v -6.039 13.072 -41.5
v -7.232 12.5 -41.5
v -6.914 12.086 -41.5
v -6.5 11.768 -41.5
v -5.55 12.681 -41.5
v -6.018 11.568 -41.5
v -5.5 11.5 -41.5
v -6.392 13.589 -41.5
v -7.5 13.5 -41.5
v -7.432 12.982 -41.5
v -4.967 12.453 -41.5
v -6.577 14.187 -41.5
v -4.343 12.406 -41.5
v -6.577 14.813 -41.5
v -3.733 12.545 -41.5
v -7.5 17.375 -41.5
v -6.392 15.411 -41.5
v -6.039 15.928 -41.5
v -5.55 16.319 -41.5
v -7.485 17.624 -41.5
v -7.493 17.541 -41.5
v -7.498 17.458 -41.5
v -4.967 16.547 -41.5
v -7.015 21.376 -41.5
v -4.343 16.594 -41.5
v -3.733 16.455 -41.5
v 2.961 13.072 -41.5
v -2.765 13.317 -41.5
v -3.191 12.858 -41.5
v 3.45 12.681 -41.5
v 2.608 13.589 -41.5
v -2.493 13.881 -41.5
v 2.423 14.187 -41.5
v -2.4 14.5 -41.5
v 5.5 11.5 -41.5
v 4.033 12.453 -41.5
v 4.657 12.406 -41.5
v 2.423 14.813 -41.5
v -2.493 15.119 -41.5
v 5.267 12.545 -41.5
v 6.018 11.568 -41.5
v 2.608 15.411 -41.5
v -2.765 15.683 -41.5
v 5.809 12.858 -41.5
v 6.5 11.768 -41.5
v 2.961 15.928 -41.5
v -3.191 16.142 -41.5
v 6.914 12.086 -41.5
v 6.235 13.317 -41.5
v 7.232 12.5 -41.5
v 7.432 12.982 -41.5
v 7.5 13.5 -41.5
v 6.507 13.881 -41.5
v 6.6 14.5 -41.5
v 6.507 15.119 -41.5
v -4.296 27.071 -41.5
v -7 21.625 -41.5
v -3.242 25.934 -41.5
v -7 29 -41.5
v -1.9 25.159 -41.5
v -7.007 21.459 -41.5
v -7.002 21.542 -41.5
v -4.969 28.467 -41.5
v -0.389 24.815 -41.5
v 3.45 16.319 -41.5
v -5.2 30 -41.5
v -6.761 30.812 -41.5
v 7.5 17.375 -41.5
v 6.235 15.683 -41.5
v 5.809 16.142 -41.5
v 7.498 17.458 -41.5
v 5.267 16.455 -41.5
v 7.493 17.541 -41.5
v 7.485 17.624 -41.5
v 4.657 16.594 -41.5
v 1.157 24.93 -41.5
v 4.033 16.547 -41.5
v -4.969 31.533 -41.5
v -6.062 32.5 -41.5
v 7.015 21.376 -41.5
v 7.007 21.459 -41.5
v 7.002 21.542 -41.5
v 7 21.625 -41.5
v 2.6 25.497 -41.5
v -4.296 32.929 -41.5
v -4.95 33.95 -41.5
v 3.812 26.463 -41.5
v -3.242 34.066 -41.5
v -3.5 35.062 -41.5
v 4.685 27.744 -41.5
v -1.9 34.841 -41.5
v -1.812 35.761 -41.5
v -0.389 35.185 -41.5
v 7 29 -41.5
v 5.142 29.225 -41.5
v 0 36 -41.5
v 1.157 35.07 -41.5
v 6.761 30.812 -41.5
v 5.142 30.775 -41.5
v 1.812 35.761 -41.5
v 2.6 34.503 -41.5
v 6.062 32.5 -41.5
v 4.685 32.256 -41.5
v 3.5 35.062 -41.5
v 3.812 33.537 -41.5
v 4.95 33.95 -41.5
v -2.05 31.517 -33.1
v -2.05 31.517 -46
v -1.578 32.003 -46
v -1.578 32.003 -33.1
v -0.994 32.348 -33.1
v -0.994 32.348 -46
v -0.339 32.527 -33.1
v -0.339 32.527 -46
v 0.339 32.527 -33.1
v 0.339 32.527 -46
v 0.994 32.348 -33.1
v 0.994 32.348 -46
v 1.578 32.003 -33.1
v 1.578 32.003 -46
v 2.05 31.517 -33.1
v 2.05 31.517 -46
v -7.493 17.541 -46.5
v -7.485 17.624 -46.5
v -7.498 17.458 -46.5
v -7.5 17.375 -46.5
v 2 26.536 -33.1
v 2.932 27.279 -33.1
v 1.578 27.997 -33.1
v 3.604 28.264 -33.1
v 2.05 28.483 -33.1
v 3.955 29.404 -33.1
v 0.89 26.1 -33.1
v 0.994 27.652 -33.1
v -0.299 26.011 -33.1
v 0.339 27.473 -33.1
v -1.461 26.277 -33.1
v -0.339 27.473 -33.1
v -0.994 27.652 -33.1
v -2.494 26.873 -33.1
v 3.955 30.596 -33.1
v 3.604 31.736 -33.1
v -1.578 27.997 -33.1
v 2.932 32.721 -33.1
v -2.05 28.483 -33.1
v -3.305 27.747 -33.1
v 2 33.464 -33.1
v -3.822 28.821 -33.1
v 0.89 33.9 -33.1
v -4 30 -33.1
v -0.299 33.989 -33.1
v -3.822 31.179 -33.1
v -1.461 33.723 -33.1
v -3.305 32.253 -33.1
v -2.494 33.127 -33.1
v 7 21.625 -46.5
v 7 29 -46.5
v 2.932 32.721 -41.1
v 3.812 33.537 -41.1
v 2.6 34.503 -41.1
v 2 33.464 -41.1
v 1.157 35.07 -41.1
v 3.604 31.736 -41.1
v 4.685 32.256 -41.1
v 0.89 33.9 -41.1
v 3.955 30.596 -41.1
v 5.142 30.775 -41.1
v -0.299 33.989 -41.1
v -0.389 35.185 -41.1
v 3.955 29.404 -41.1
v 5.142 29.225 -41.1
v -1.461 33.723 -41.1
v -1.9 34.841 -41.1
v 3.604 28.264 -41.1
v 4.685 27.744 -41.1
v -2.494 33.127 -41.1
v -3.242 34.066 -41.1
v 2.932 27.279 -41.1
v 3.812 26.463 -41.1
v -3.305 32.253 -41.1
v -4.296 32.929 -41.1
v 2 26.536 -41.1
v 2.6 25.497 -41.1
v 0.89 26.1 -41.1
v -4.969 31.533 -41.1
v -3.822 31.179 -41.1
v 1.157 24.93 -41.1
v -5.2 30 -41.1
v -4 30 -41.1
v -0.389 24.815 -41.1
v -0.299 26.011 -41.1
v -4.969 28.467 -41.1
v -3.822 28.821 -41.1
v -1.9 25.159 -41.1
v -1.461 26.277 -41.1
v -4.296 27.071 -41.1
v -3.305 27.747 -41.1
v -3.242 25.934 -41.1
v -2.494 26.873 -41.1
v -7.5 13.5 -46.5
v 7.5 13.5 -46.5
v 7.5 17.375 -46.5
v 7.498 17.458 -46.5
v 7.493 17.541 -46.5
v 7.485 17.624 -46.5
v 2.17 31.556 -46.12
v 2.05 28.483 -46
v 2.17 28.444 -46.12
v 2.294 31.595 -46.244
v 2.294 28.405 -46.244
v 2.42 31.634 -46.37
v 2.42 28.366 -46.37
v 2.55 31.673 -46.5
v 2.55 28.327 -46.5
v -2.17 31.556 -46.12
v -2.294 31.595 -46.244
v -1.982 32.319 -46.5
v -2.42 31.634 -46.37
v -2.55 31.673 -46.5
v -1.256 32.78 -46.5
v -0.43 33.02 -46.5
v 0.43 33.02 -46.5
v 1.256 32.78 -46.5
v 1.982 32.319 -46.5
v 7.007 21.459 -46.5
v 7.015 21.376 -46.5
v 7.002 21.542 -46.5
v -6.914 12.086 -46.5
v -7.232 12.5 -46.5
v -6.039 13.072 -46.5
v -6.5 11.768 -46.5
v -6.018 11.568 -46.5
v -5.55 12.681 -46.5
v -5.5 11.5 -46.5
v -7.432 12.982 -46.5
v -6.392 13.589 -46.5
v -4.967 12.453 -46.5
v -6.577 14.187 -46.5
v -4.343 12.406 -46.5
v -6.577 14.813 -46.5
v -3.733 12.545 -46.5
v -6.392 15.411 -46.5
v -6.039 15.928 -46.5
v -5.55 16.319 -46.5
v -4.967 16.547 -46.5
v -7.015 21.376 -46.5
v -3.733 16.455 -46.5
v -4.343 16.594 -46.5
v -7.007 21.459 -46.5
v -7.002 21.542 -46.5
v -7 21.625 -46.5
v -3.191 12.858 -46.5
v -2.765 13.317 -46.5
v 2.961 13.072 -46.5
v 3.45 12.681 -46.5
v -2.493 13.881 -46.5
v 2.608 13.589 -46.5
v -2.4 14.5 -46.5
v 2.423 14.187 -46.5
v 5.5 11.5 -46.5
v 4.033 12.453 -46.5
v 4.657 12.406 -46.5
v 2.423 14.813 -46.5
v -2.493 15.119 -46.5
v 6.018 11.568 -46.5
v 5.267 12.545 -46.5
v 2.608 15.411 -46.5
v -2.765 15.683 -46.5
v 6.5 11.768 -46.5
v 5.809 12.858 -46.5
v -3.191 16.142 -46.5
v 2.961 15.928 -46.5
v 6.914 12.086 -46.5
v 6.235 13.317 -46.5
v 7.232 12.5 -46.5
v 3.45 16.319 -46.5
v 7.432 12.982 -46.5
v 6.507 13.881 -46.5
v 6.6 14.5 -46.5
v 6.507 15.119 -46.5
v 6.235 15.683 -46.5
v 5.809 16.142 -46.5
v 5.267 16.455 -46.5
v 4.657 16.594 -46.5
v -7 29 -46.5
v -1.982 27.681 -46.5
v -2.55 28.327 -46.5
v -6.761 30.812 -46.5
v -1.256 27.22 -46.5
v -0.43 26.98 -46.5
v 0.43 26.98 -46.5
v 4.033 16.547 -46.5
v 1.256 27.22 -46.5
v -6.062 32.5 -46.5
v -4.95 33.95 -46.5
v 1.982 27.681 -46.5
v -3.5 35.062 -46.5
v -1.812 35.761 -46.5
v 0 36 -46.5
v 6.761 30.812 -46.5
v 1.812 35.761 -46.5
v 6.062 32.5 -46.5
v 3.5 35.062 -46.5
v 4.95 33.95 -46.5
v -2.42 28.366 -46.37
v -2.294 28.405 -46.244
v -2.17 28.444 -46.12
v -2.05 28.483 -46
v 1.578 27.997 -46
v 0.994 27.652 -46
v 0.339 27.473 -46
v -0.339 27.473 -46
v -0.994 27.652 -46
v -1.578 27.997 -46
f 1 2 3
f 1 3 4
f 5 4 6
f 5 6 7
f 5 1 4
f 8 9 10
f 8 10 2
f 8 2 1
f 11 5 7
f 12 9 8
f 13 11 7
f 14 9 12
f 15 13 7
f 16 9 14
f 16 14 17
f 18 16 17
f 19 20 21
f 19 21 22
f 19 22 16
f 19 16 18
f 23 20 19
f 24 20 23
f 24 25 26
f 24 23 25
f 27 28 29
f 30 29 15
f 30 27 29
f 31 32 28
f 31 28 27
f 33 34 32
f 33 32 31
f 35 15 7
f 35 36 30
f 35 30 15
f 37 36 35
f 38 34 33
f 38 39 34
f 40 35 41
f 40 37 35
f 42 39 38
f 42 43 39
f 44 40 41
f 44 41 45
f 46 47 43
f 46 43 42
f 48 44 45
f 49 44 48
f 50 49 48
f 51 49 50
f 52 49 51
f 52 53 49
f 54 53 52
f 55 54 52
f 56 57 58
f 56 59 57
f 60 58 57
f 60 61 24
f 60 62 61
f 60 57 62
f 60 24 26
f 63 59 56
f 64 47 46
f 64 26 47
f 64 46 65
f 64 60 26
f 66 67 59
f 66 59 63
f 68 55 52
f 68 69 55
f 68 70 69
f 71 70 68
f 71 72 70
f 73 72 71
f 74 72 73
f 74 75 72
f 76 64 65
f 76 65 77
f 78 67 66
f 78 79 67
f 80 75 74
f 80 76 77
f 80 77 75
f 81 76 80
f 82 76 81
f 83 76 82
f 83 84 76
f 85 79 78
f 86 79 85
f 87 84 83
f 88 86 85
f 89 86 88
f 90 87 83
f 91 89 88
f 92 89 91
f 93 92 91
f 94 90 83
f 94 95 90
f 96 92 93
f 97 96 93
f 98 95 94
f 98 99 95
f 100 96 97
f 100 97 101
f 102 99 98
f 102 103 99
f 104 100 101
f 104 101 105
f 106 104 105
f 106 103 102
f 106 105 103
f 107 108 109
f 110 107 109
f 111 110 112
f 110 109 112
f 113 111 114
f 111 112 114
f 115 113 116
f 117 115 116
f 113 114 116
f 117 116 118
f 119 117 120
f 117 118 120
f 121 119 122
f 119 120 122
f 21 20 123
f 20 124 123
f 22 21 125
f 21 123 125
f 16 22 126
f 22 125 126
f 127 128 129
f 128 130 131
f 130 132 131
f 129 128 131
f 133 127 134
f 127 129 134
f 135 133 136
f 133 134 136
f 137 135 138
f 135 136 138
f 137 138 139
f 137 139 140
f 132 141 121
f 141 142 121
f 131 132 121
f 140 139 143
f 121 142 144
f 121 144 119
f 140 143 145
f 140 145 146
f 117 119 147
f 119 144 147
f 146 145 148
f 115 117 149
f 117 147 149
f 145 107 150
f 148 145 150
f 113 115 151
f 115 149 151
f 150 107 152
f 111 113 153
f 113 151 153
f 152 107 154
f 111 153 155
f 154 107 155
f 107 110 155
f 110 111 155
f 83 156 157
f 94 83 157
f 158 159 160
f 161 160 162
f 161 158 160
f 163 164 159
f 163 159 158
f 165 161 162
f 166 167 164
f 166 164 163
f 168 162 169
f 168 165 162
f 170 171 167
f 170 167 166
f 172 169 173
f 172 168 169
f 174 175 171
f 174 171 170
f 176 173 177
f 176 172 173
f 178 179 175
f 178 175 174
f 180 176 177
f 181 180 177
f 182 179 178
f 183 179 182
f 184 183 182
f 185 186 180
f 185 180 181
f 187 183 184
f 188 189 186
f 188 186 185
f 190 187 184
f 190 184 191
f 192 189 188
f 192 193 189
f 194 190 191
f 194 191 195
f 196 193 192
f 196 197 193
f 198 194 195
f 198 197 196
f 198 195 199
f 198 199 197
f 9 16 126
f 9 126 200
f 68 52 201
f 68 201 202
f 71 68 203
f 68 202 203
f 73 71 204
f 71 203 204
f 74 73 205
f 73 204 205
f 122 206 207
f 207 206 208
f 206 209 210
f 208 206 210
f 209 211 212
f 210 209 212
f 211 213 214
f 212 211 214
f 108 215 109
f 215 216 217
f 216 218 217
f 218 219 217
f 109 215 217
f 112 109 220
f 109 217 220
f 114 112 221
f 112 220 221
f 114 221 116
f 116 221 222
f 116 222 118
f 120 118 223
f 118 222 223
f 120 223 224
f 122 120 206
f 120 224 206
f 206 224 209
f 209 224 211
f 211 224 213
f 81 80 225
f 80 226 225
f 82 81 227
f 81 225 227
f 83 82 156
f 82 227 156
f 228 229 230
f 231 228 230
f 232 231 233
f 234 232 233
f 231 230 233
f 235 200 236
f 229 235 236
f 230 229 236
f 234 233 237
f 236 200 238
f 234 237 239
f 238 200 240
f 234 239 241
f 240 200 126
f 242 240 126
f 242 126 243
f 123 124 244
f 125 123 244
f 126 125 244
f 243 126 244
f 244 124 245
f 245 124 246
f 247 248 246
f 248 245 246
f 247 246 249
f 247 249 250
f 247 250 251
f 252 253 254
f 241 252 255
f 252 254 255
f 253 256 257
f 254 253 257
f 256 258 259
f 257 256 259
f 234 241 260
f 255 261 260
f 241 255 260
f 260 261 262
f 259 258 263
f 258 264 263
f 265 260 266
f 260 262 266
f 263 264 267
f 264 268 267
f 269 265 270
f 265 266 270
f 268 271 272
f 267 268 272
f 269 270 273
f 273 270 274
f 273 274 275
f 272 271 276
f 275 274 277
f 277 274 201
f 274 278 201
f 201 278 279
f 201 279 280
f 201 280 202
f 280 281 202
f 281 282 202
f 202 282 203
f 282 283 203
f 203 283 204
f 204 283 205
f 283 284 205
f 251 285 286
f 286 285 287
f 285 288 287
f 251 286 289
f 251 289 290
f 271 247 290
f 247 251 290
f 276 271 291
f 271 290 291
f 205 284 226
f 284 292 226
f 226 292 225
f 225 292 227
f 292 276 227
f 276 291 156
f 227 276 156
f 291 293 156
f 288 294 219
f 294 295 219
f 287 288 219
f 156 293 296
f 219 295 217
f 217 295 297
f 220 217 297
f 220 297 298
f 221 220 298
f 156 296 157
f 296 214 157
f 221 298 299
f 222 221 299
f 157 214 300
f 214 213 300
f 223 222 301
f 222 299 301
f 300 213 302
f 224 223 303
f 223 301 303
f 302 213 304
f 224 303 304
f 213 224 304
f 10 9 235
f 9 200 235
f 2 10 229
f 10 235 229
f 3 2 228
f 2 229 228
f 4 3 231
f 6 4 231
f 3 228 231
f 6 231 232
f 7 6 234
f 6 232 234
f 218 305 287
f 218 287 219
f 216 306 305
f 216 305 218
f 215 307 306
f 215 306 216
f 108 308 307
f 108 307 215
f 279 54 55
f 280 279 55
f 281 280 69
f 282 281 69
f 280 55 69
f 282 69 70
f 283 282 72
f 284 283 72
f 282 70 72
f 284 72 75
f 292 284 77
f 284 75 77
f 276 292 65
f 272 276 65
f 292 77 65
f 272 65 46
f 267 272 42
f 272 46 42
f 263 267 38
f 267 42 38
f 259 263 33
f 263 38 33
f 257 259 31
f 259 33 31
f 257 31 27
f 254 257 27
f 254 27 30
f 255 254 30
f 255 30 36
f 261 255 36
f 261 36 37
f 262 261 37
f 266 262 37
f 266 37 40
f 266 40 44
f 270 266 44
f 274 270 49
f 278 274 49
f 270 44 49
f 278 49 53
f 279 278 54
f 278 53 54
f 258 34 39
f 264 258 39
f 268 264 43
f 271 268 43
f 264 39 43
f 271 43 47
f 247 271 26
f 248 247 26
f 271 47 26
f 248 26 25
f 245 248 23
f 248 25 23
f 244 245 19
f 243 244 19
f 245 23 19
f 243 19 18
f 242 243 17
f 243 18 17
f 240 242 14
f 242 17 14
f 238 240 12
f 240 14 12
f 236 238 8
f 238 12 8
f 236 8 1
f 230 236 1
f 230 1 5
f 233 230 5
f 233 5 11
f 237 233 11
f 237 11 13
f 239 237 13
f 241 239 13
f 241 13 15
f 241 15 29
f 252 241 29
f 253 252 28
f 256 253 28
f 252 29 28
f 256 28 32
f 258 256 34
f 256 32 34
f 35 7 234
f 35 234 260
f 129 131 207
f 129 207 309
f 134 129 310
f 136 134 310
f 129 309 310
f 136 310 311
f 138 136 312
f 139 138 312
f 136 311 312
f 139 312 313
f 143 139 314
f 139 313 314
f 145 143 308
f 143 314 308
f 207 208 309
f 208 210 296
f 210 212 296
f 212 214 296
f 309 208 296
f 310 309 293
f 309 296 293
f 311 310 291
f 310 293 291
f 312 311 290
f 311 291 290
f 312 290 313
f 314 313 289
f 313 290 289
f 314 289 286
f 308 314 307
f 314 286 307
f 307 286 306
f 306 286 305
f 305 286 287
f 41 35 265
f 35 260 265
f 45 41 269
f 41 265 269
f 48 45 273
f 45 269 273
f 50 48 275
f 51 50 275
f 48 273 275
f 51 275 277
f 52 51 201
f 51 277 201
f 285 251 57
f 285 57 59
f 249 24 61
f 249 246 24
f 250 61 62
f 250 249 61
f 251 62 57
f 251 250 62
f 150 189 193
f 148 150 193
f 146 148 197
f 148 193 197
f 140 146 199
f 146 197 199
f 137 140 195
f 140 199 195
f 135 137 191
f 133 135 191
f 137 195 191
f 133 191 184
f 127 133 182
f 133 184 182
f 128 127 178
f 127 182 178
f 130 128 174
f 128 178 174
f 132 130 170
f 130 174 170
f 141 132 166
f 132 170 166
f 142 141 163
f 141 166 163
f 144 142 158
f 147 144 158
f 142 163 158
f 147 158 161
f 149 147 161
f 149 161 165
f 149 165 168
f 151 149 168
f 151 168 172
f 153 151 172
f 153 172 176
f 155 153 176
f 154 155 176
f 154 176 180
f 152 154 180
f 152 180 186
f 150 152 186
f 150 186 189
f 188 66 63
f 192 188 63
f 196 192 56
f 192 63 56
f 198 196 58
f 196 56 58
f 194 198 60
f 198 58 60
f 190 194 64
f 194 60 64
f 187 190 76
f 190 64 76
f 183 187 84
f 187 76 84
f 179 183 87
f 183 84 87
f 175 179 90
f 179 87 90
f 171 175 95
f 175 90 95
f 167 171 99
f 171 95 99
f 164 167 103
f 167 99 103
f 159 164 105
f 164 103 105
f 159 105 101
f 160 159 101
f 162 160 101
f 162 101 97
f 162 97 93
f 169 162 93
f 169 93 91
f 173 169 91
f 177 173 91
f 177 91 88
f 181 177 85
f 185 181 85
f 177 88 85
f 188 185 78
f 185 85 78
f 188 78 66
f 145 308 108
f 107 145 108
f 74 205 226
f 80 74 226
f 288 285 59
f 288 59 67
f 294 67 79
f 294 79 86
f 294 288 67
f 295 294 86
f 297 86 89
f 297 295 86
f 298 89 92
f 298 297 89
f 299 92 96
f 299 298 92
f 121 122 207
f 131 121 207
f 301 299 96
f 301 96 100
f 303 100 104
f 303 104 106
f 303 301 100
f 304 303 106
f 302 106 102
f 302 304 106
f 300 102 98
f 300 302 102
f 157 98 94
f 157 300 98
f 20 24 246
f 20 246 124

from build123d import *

# Parameters (mm, degrees)
SKETCH2_W           = 71.4
SKETCH2_H           = 93
SKETCH2_W_2         = 51.4
SKETCH2_H_2         = 73
BOSS_EXTRUDE1_DEPTH = 10
SKETCH3_W           = 14
SKETCH3_H           = 26
SKETCH3_R           = 2.75
BOSS_EXTRUDE2_DEPTH = 5
SKETCH4_R           = 4
SKETCH4_R_2         = 2.75
BOSS_EXTRUDE3_DEPTH = 8.4
SKETCH5_W           = 51.4
SKETCH5_H           = 10
CUT_EXTRUDE1_DEPTH  = 65.130647899
SKETCH6_R           = 5.2
SKETCH6_R_2         = 4
BOSS_EXTRUDE4_DEPTH = 0.4
SKETCH7_W           = 71.4
SKETCH7_H           = 25
CUT_EXTRUDE2_DEPTH  = 65.130647899
FILLET1_START       = -46.5
FILLET1_DEPTH       = 5
FILLET1_2_DEPTH     = 5
SKETCH10_W          = 71.4
SKETCH10_H          = 58
CUT_EXTRUDE3_DEPTH  = 65.130647899
SKETCH9_R           = 2.55
CUT_EXTRUDE4_DEPTH  = 53.440919138
FILLET2_R           = 5
SKETCH11_R          = 2.75
BOSS_EXTRUDE5_DEPTH = 13.4
CHAMFER1_SIZE       = 0.5
CUT_EXTRUDE5_DEPTH  = 52.676783956
SKETCH14_R          = 2.1
BOSS_EXTRUDE6_DEPTH = 5
FILLET3_R           = 2


with BuildPart() as part:
    # Sketch2 → Boss-Extrude1 (new body)
    with BuildSketch(Plane(origin=(0, 0, 0), x_dir=(1, 0, 0), z_dir=(0, 1, 0))):
        Rectangle(SKETCH2_W, SKETCH2_H)
        Rectangle(SKETCH2_W_2, SKETCH2_H_2, mode=Mode.SUBTRACT)
    extrude(amount=BOSS_EXTRUDE1_DEPTH)

    # Sketch3 → Boss-Extrude2 (add)
    with BuildSketch(Plane(origin=(0, 0, -46.5), x_dir=(-1, 0, 0), z_dir=(0, 0, -1))):
        with Locations((0, 23)):
            Rectangle(SKETCH3_W, SKETCH3_H)
        with Locations((0, 30)):
            Circle(SKETCH3_R, mode=Mode.SUBTRACT)
    extrude(amount=-BOSS_EXTRUDE2_DEPTH)

    # Sketch4 → Boss-Extrude3 (add)
    with BuildSketch(Plane.XY.offset(-41.5)):
        with Locations(Location((0, 30, 0), (0, 0, 180))):
            Circle(SKETCH4_R)
        with Locations(Location((0, 30, 0), (0, 0, 180))):
            Circle(SKETCH4_R_2, mode=Mode.SUBTRACT)
    extrude(amount=BOSS_EXTRUDE3_DEPTH)

    # Sketch5 → Cut-Extrude1 (cut, through all)
    with BuildSketch(Plane(origin=(0, 10, 0), x_dir=(1, 0, 0), z_dir=(0, 1, 0))):
        with Locations((0, -41.5)):
            Rectangle(SKETCH5_W, SKETCH5_H)
    extrude(amount=-CUT_EXTRUDE1_DEPTH, mode=Mode.SUBTRACT)

    # Sketch6 → Boss-Extrude4 (add)
    with BuildSketch(Plane.XY.offset(-41.5)):
        with Locations(Location((0, 30, 0), (0, 0, 180))):
            Circle(SKETCH6_R)
        with Locations((0, 30)):
            Circle(SKETCH6_R_2, mode=Mode.SUBTRACT)
    extrude(amount=BOSS_EXTRUDE4_DEPTH)

    # Sketch7 → Cut-Extrude2 (cut, through all)
    with BuildSketch(Plane(origin=(0, 10, 0), x_dir=(1, 0, 0), z_dir=(0, 1, 0))):
        with Locations((0, -34)):
            Rectangle(SKETCH7_W, SKETCH7_H)
    extrude(amount=-CUT_EXTRUDE2_DEPTH, mode=Mode.SUBTRACT)

    # Fillet1: read off the stored shape, not the designer's step
    # Fillet1 outline → Fillet1 (cut)
    with BuildSketch(Plane.XY.offset(FILLET1_START)):
        with BuildLine():
            ThreePointArc((0, 36), (4.949747468, 33.949747468), (7, 29))
            Line((7, 29), (7, 36))
            Line((7, 36), (0, 36))
        make_face()
        with BuildLine():
            ThreePointArc((-7, 29), (-4.949747468, 33.949747468), (0, 36))
            Line((0, 36), (-7, 36))
            Line((-7, 36), (-7, 29))
        make_face()
    extrude(amount=FILLET1_DEPTH, mode=Mode.SUBTRACT)

    # Fillet1 2 outline → Fillet1 2 (add)
    with BuildSketch(Plane.XY.offset(FILLET1_START)):
        with BuildLine():
            ThreePointArc((14, 10), (9.050252532, 12.050252532), (7, 17))
            Line((7, 17), (7, 10))
            Line((7, 10), (14, 10))
        make_face()
        with BuildLine():
            Line((-14, 10), (-7, 10))
            Line((-7, 10), (-7, 17))
            ThreePointArc((-7, 17), (-9.050252532, 12.050252532), (-14, 10))
        make_face()
    extrude(amount=FILLET1_2_DEPTH)

    # Sketch10 → Cut-Extrude3 (cut, through all)
    with BuildSketch(Plane(origin=(0, 10, 0), x_dir=(1, 0, 0), z_dir=(0, 1, 0))):
        with Locations((0, 7.5)):
            Rectangle(SKETCH10_W, SKETCH10_H)
    extrude(amount=-CUT_EXTRUDE3_DEPTH, mode=Mode.SUBTRACT)

    # Sketch9 → Cut-Extrude4 (cut, through all)
    with BuildSketch(Plane(origin=(0, 0, -46.5), x_dir=(-1, 0, 0), z_dir=(0, 0, -1))):
        with Locations((-28.2, 5)):
            Circle(SKETCH9_R)
        with Locations((28.2, 5)):
            Circle(SKETCH9_R)
    extrude(amount=-CUT_EXTRUDE4_DEPTH, mode=Mode.SUBTRACT)

    # Fillet2
    fillet2_edges = [part.edges().sort_by_distance(p)[0] for p in [
        (-35.7, 10, -41.5),
        (-35.7, 0, -41.5),
        (35.7, 0, -41.5),
        (35.7, 10, -41.5),
    ]]
    fillet(fillet2_edges, radius=FILLET2_R - 0.0001)  # a hair under: the kernel refuses the full size

    # Sketch11 → Boss-Extrude5 (add)
    with BuildSketch(Plane(origin=(0, 0, -46.5), x_dir=(-1, 0, 0), z_dir=(0, 0, -1))):
        with Locations((0, 30)):
            Circle(SKETCH11_R)
        with BuildLine():
            Line((-2.05, 31.516575089), (-2.05, 28.483424911))
            ThreePointArc((-2.05, 28.483424911), (0, 27.45), (2.05, 28.483424911))
            Line((2.05, 28.483424911), (2.05, 31.516575089))
            ThreePointArc((2.05, 31.516575089), (0, 32.55), (-2.05, 31.516575089))
        make_face(mode=Mode.SUBTRACT)
    extrude(amount=-BOSS_EXTRUDE5_DEPTH)

    # Chamfer1
    chamfer1_edges = [part.edges().sort_by_distance(p)[0] for p in [
        (0, 32.55, -46.5),
        (-2.05, 30, -46.5),
        (0, 27.45, -46.5),
        (2.05, 30, -46.5),
    ]]
    chamfer(chamfer1_edges, length=CHAMFER1_SIZE)

    # Sketch12 → Cut-Extrude5 (cut, through all)
    with BuildSketch(Plane.XY.offset(-36.5)):
        with BuildLine():
            Line((-7, 17), (7, 17))
            ThreePointArc((7, 17), (9.050252532, 12.050252532), (14, 10))
            Line((14, 10), (30.7, 10))
            ThreePointArc((30.7, 10), (34.235533906, 8.535533906), (35.7, 5))
            ThreePointArc((35.7, 5), (34.235533906, 1.464466094), (30.7, 0))
            Line((30.7, 0), (-30.7, 0))
            ThreePointArc((-30.7, 0), (-34.235533906, 1.464466094), (-35.7, 5))
            ThreePointArc((-35.7, 5), (-34.235533906, 8.535533906), (-30.7, 10))
            Line((-30.7, 10), (-14, 10))
            ThreePointArc((-14, 10), (-9.050252532, 12.050252532), (-7, 17))
        make_face()
    extrude(amount=-CUT_EXTRUDE5_DEPTH, mode=Mode.SUBTRACT)


with BuildPart() as cut_extrude5_kept_piece:
    # of the separate pieces the step leaves, the one the design keeps (cut_extrude5_pieces_kept)
    add(part.part.solids().sort_by_distance((7, 17, -46.5))[0])

    # Sketch14 → Boss-Extrude6 (add)
    with BuildSketch(Plane.XY.offset(-41.5)):
        Polygon((-7, 21.5), (-7.5, 17.5), (-7.5, 11.5), (7.5, 11.5), (7.5, 17.5), (7, 21.5), (7, 17), (-7, 17), align=None)
        with Locations((-4.5, 14.5)):
            Circle(SKETCH14_R, mode=Mode.SUBTRACT)
        with Locations((4.5, 14.5)):
            Circle(SKETCH14_R, mode=Mode.SUBTRACT)
    extrude(amount=-BOSS_EXTRUDE6_DEPTH)

    # Fillet3
    fillet3_edges = [cut_extrude5_kept_piece.edges().sort_by_distance(p)[0] for p in [
        (-7.5, 17.5, -44),
        (-7.5, 11.5, -44),
        (7.5, 11.5, -44),
        (7.5, 17.5, -44),
        (7, 21.5, -44),
        (-7, 21.5, -44),
    ]]
    fillet(fillet3_edges, radius=FILLET3_R)


solid = cut_extrude5_kept_piece.part
